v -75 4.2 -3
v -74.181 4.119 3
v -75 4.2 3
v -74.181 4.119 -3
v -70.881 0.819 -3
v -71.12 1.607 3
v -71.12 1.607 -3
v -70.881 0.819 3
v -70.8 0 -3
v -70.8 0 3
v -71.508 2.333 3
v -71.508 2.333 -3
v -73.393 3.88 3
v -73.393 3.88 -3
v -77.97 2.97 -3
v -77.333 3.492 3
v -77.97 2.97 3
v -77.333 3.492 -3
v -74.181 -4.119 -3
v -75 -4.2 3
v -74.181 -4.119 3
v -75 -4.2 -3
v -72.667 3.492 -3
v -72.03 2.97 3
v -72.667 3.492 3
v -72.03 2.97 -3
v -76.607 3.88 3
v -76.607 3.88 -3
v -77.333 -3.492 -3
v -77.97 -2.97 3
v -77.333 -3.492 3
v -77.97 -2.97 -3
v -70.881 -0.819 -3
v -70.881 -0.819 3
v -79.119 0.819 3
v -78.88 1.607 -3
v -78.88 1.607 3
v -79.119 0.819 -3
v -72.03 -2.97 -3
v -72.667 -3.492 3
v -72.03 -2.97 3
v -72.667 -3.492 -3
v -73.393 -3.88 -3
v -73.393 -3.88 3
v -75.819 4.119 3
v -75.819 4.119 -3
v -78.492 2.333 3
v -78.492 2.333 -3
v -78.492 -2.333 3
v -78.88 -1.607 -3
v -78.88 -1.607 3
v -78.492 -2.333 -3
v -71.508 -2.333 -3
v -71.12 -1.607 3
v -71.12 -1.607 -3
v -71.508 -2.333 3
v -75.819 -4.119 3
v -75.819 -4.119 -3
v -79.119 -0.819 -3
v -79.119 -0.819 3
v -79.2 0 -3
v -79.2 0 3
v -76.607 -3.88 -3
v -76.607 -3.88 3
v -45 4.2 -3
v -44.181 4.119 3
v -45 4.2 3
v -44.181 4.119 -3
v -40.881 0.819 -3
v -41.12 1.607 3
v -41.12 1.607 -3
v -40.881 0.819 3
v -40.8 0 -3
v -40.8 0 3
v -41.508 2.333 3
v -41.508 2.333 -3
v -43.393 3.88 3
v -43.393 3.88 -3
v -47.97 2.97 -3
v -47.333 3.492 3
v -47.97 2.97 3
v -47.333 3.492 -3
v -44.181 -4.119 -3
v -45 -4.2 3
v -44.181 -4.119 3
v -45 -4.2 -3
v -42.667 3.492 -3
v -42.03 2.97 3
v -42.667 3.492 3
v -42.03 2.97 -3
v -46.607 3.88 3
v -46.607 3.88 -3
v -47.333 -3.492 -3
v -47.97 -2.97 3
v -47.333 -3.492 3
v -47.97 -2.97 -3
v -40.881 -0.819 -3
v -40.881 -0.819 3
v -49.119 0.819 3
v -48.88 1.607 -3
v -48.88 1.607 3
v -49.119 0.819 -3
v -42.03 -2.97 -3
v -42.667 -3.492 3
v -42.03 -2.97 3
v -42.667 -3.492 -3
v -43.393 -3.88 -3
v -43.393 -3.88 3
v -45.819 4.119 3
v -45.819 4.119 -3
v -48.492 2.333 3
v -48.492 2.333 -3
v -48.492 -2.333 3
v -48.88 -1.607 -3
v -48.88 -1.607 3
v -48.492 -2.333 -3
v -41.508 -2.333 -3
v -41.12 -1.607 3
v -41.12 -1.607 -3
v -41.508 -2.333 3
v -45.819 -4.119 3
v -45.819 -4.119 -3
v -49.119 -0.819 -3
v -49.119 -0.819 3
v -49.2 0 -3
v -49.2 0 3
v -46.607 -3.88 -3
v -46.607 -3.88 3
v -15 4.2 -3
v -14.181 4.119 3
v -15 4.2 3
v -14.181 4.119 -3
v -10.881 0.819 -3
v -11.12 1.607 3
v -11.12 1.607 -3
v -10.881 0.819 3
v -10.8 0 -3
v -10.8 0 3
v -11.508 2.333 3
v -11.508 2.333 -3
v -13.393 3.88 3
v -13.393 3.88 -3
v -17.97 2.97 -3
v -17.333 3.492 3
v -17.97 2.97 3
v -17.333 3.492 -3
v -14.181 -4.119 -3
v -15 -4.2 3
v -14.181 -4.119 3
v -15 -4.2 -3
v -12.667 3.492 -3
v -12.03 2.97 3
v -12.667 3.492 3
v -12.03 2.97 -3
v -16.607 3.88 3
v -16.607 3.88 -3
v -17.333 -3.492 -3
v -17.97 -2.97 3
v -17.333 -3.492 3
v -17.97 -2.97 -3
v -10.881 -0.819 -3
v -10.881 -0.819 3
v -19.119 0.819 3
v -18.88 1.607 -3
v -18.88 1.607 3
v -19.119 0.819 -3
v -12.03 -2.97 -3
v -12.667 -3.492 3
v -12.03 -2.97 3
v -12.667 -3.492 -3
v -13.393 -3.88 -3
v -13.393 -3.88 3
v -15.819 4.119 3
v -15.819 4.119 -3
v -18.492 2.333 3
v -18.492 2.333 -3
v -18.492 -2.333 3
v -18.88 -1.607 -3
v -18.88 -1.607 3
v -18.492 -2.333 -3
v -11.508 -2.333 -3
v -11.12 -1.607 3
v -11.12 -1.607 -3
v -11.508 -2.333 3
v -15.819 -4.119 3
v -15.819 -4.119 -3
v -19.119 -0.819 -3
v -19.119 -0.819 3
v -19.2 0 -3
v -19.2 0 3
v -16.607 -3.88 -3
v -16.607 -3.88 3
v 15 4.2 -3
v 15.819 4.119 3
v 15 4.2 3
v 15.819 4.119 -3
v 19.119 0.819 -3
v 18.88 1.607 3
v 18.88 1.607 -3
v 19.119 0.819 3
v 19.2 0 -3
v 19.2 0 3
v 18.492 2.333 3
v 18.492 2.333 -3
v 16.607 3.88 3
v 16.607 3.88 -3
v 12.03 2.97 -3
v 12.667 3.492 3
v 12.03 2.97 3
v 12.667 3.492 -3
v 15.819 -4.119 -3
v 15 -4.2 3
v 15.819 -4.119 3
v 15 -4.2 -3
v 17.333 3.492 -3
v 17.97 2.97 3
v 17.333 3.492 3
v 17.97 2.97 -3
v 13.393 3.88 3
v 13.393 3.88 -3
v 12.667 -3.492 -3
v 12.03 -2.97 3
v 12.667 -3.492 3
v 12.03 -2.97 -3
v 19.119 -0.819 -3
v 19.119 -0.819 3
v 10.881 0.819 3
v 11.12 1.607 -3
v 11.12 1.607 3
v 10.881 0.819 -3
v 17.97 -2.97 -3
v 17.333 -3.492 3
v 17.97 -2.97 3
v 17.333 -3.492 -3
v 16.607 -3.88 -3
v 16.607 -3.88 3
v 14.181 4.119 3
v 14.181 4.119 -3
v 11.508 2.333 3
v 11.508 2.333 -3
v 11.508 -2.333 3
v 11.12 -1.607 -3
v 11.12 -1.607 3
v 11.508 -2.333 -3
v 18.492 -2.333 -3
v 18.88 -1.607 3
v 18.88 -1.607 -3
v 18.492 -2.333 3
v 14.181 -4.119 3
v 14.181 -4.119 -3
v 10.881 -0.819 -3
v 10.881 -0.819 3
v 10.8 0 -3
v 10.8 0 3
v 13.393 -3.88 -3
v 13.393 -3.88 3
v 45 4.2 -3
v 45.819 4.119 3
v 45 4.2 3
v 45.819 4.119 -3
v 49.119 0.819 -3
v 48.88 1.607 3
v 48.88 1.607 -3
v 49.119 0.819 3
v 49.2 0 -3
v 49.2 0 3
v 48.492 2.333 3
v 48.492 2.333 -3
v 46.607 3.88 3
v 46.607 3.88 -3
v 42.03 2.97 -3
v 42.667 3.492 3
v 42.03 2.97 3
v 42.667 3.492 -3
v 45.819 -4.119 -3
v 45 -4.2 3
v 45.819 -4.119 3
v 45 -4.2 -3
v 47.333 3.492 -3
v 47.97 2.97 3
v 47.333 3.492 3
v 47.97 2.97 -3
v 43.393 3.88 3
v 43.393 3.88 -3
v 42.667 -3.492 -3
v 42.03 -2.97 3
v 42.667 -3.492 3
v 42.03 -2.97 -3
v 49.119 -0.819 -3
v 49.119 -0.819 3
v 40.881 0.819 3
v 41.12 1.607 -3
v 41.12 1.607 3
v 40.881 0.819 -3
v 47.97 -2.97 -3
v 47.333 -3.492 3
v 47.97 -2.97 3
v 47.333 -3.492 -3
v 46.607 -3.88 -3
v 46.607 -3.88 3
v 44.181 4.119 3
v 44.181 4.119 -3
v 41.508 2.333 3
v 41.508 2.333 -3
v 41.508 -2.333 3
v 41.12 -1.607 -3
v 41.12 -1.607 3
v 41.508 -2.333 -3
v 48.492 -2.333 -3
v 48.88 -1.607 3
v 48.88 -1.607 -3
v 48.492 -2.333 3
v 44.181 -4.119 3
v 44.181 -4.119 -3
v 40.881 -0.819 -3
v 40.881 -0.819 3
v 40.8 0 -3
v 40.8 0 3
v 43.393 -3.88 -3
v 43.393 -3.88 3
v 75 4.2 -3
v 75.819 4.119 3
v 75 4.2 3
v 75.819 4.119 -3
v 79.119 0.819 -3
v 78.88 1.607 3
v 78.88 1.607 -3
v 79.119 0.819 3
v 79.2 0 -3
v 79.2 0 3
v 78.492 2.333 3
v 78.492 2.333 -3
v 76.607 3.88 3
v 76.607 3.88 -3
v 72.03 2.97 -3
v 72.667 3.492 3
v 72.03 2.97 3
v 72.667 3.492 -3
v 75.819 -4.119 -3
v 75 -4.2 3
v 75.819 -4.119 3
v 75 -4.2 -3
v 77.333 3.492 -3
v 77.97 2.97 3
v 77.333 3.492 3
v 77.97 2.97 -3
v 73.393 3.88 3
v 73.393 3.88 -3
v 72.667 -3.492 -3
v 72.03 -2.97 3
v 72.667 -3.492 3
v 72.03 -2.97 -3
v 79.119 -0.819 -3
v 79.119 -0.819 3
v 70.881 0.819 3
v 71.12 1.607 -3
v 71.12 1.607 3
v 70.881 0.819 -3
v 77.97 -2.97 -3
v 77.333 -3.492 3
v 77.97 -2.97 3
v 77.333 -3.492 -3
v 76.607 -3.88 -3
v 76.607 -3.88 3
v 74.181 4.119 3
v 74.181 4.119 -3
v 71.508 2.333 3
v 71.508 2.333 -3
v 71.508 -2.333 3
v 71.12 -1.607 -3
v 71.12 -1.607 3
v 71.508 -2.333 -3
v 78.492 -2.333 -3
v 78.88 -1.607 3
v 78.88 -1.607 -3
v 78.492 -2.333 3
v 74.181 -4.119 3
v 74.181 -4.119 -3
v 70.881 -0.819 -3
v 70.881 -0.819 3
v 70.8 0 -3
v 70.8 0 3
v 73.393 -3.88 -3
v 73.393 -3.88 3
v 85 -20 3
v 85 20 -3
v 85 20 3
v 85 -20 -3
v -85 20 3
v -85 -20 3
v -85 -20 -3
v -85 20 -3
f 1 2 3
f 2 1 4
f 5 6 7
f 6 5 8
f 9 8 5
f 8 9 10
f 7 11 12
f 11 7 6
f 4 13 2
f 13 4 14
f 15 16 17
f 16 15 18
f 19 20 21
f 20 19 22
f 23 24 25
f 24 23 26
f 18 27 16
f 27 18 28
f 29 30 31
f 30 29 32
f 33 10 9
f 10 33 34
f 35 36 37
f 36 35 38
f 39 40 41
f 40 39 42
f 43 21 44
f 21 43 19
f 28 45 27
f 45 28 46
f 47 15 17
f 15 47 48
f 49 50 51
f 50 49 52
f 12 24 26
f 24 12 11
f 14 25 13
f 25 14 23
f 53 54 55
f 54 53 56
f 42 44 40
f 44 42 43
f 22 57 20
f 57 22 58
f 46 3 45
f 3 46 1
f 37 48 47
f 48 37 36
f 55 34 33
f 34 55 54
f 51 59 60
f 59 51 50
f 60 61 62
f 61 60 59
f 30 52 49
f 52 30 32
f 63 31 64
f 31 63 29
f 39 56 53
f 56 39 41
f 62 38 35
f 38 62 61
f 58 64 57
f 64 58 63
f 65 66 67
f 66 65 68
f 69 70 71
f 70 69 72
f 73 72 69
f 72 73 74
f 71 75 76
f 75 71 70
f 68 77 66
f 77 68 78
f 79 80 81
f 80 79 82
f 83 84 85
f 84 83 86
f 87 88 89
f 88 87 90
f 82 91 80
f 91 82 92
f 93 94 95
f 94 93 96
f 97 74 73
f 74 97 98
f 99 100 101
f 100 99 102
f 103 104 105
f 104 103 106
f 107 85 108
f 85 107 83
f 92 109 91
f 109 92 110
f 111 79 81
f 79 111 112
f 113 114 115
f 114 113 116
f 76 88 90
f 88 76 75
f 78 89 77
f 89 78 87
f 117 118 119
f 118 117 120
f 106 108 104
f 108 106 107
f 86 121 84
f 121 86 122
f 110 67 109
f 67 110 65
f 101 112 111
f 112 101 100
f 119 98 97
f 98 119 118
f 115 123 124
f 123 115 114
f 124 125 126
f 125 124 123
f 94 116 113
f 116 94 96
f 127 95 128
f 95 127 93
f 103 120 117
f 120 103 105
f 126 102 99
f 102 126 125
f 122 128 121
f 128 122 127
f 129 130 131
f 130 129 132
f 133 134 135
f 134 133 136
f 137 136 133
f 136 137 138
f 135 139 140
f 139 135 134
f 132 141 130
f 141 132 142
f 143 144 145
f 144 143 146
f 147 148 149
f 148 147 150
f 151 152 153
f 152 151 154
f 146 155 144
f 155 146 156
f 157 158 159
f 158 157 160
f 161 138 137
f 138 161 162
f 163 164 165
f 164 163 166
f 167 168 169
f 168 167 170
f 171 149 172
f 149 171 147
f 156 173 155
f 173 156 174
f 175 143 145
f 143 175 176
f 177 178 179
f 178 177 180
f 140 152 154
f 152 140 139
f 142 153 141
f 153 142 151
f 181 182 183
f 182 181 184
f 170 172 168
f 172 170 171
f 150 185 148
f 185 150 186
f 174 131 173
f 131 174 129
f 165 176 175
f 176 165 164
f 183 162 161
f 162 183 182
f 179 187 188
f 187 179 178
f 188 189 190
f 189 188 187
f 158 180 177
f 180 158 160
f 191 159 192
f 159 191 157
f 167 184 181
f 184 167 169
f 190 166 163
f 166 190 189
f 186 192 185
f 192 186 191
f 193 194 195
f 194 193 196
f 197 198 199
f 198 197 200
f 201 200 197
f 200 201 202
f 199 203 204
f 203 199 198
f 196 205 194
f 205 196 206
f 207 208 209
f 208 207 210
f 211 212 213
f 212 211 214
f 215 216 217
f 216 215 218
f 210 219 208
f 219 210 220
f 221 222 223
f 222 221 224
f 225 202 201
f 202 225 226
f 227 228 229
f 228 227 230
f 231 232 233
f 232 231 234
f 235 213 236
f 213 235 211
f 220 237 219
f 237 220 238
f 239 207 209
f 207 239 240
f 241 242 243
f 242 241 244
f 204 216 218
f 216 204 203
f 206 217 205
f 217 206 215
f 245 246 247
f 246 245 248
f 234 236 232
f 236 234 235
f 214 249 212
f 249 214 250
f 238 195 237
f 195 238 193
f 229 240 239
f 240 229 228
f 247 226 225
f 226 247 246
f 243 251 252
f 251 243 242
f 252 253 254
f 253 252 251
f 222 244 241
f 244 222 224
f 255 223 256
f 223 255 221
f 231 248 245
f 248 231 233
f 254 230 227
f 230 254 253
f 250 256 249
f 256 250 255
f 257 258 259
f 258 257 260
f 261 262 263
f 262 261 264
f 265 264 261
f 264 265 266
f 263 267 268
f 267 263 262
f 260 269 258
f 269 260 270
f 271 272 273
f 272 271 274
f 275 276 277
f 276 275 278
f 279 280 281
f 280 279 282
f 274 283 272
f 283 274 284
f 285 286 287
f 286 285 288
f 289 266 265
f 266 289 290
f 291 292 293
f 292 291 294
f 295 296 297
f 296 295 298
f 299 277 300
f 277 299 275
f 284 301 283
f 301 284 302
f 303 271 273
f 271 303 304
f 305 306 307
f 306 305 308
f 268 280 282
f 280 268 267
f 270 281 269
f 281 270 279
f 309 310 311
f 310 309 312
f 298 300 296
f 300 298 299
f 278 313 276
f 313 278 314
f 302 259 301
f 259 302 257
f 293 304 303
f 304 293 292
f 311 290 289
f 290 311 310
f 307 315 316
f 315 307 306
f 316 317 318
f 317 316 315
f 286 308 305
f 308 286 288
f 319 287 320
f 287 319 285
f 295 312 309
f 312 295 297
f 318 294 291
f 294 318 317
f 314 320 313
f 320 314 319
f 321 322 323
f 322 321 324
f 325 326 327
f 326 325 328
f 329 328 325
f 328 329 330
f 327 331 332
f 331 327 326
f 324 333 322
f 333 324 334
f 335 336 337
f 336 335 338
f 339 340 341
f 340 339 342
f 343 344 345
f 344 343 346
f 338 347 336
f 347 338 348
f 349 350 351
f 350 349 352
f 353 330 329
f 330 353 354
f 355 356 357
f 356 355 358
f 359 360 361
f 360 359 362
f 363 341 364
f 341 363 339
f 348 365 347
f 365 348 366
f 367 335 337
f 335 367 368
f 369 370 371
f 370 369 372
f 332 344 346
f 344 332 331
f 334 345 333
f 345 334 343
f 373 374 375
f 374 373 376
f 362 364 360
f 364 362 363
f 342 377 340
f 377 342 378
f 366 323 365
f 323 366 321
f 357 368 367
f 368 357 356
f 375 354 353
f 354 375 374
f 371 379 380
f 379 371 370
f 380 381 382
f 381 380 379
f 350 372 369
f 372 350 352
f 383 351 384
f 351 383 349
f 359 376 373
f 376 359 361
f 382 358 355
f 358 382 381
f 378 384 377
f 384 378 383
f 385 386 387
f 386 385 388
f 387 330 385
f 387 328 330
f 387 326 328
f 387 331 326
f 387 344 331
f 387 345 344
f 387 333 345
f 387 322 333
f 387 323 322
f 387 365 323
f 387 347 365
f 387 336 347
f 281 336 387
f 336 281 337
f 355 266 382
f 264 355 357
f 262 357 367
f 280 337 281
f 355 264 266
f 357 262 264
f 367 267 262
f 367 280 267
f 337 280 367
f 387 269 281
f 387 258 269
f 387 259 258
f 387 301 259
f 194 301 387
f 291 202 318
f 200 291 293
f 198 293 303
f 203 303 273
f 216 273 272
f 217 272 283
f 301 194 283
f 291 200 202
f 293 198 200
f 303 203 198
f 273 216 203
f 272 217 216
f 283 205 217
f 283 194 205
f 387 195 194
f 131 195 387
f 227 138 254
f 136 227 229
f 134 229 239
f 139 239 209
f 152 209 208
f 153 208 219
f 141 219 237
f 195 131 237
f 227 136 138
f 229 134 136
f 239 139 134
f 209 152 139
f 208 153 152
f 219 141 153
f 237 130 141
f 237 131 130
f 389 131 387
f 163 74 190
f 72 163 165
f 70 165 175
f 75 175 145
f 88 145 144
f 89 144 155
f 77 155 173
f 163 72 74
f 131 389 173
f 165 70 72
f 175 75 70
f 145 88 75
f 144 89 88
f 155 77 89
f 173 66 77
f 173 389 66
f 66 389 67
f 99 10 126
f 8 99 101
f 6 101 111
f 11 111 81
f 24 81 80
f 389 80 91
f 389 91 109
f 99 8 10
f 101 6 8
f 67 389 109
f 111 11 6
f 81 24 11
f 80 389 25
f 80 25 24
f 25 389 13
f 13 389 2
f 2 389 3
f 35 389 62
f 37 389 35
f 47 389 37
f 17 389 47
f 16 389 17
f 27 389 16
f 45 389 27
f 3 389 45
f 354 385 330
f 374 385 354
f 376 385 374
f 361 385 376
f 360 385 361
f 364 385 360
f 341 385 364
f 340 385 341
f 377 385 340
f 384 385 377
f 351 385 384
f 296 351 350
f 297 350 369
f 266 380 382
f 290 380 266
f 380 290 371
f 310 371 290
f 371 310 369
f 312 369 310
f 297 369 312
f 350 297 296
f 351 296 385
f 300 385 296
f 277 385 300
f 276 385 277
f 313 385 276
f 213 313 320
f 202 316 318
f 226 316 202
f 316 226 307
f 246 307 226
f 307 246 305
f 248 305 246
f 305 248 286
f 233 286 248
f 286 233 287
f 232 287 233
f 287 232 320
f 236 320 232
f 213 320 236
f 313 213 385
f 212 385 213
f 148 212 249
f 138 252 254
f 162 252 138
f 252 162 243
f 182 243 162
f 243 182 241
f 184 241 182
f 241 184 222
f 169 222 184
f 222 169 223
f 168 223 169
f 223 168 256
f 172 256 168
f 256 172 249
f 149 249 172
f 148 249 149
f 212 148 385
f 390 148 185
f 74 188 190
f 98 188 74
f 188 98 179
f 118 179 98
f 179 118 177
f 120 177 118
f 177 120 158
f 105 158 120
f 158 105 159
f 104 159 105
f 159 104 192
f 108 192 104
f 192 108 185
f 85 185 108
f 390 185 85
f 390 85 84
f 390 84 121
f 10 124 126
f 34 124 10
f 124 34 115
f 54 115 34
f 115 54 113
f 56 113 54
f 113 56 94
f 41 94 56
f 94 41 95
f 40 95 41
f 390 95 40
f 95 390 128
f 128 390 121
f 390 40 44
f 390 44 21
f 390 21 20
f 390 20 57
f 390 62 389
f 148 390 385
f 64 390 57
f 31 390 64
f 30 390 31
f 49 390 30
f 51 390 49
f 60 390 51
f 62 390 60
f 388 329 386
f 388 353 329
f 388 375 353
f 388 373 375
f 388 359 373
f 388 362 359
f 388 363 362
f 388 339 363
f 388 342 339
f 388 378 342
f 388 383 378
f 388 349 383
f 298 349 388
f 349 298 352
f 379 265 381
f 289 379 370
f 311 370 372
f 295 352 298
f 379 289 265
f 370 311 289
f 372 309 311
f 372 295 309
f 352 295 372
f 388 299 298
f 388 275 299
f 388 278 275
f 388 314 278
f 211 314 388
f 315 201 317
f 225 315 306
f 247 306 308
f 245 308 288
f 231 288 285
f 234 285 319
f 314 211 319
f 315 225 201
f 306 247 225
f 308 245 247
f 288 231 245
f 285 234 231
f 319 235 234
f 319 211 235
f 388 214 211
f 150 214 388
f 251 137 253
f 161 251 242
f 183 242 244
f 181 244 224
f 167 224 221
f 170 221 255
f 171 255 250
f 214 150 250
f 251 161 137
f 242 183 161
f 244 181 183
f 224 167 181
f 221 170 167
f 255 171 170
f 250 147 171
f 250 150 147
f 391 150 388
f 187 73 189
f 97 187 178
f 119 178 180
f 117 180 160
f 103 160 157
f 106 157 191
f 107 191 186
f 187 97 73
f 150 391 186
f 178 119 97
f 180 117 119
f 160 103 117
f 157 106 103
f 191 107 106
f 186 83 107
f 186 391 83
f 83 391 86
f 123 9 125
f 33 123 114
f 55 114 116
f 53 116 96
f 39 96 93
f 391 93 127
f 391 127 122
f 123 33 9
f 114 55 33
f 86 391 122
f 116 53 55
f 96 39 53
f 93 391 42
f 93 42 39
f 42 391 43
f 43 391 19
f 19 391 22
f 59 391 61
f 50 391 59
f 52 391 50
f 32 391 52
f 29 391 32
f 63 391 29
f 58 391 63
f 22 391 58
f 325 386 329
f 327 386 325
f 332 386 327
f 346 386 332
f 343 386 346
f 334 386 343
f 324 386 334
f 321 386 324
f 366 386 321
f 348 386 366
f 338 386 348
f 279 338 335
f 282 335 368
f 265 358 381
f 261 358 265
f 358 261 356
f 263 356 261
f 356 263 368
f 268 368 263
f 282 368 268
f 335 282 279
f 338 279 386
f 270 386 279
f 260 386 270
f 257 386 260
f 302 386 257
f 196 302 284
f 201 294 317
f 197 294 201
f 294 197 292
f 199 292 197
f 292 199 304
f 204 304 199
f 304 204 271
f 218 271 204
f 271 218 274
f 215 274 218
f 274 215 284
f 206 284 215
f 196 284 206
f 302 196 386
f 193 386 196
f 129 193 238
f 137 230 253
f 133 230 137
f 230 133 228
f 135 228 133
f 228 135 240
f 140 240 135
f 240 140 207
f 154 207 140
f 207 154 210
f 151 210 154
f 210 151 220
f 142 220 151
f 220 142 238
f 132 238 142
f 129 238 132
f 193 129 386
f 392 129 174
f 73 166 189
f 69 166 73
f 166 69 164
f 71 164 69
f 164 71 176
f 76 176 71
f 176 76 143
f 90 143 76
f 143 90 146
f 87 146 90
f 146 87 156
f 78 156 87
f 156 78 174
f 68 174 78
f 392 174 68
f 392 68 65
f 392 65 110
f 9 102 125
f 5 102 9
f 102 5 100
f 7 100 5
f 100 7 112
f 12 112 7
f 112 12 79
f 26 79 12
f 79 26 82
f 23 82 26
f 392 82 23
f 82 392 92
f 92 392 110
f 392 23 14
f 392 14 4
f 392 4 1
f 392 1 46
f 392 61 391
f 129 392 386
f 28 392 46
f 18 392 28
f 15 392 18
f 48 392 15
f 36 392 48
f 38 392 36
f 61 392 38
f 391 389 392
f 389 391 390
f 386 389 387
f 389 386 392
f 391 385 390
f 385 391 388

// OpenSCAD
$fn = 32;

// ----------------------------------------------------------------------
// Hole bar, 6 x Ø8.4
// skip layout, 10 mm edge offset
// ----------------------------------------------------------------------

// --- parameters (mm) ---
bar_w = 40;       // bar width (Y)
bar_t = 6;        // bar thickness (Z)
holes = 6;        // holes per row
hole_d = 8.4;     // hole diameter
edge = 10;        // offset from the bar end to the first hole
grid_pitch = 15;  // grid the bar was laid out on

// --- derived feature positions (mm) ---
pitch = grid_pitch * 2;       // = 30   holes sit every other grid slot
span = (holes - 1) * pitch;   // = 150   distance between the end holes
bar_l = span + 2 * edge;      // = 170   overall bar length
start_x = -bar_l / 2 + edge;  // = -75   X of the first hole
feature_centers = [
  [start_x + 0 * pitch, 0],
  [start_x + 1 * pitch, 0],
  [start_x + 2 * pitch, 0],
  [start_x + 3 * pitch, 0],
  [start_x + 4 * pitch, 0],
  [start_x + 5 * pitch, 0]
];   // hole centres of the first row

// bar with one row of holes, drilled from feature_centers
difference() {
  translate([-bar_l / 2, -bar_w / 2, -bar_t / 2]) cube([bar_l, bar_w, bar_t]);
  for (centre = feature_centers)
    translate([centre[0], centre[1], 0])
      cylinder(d = hole_d, h = bar_t + 2, center = true);
}
